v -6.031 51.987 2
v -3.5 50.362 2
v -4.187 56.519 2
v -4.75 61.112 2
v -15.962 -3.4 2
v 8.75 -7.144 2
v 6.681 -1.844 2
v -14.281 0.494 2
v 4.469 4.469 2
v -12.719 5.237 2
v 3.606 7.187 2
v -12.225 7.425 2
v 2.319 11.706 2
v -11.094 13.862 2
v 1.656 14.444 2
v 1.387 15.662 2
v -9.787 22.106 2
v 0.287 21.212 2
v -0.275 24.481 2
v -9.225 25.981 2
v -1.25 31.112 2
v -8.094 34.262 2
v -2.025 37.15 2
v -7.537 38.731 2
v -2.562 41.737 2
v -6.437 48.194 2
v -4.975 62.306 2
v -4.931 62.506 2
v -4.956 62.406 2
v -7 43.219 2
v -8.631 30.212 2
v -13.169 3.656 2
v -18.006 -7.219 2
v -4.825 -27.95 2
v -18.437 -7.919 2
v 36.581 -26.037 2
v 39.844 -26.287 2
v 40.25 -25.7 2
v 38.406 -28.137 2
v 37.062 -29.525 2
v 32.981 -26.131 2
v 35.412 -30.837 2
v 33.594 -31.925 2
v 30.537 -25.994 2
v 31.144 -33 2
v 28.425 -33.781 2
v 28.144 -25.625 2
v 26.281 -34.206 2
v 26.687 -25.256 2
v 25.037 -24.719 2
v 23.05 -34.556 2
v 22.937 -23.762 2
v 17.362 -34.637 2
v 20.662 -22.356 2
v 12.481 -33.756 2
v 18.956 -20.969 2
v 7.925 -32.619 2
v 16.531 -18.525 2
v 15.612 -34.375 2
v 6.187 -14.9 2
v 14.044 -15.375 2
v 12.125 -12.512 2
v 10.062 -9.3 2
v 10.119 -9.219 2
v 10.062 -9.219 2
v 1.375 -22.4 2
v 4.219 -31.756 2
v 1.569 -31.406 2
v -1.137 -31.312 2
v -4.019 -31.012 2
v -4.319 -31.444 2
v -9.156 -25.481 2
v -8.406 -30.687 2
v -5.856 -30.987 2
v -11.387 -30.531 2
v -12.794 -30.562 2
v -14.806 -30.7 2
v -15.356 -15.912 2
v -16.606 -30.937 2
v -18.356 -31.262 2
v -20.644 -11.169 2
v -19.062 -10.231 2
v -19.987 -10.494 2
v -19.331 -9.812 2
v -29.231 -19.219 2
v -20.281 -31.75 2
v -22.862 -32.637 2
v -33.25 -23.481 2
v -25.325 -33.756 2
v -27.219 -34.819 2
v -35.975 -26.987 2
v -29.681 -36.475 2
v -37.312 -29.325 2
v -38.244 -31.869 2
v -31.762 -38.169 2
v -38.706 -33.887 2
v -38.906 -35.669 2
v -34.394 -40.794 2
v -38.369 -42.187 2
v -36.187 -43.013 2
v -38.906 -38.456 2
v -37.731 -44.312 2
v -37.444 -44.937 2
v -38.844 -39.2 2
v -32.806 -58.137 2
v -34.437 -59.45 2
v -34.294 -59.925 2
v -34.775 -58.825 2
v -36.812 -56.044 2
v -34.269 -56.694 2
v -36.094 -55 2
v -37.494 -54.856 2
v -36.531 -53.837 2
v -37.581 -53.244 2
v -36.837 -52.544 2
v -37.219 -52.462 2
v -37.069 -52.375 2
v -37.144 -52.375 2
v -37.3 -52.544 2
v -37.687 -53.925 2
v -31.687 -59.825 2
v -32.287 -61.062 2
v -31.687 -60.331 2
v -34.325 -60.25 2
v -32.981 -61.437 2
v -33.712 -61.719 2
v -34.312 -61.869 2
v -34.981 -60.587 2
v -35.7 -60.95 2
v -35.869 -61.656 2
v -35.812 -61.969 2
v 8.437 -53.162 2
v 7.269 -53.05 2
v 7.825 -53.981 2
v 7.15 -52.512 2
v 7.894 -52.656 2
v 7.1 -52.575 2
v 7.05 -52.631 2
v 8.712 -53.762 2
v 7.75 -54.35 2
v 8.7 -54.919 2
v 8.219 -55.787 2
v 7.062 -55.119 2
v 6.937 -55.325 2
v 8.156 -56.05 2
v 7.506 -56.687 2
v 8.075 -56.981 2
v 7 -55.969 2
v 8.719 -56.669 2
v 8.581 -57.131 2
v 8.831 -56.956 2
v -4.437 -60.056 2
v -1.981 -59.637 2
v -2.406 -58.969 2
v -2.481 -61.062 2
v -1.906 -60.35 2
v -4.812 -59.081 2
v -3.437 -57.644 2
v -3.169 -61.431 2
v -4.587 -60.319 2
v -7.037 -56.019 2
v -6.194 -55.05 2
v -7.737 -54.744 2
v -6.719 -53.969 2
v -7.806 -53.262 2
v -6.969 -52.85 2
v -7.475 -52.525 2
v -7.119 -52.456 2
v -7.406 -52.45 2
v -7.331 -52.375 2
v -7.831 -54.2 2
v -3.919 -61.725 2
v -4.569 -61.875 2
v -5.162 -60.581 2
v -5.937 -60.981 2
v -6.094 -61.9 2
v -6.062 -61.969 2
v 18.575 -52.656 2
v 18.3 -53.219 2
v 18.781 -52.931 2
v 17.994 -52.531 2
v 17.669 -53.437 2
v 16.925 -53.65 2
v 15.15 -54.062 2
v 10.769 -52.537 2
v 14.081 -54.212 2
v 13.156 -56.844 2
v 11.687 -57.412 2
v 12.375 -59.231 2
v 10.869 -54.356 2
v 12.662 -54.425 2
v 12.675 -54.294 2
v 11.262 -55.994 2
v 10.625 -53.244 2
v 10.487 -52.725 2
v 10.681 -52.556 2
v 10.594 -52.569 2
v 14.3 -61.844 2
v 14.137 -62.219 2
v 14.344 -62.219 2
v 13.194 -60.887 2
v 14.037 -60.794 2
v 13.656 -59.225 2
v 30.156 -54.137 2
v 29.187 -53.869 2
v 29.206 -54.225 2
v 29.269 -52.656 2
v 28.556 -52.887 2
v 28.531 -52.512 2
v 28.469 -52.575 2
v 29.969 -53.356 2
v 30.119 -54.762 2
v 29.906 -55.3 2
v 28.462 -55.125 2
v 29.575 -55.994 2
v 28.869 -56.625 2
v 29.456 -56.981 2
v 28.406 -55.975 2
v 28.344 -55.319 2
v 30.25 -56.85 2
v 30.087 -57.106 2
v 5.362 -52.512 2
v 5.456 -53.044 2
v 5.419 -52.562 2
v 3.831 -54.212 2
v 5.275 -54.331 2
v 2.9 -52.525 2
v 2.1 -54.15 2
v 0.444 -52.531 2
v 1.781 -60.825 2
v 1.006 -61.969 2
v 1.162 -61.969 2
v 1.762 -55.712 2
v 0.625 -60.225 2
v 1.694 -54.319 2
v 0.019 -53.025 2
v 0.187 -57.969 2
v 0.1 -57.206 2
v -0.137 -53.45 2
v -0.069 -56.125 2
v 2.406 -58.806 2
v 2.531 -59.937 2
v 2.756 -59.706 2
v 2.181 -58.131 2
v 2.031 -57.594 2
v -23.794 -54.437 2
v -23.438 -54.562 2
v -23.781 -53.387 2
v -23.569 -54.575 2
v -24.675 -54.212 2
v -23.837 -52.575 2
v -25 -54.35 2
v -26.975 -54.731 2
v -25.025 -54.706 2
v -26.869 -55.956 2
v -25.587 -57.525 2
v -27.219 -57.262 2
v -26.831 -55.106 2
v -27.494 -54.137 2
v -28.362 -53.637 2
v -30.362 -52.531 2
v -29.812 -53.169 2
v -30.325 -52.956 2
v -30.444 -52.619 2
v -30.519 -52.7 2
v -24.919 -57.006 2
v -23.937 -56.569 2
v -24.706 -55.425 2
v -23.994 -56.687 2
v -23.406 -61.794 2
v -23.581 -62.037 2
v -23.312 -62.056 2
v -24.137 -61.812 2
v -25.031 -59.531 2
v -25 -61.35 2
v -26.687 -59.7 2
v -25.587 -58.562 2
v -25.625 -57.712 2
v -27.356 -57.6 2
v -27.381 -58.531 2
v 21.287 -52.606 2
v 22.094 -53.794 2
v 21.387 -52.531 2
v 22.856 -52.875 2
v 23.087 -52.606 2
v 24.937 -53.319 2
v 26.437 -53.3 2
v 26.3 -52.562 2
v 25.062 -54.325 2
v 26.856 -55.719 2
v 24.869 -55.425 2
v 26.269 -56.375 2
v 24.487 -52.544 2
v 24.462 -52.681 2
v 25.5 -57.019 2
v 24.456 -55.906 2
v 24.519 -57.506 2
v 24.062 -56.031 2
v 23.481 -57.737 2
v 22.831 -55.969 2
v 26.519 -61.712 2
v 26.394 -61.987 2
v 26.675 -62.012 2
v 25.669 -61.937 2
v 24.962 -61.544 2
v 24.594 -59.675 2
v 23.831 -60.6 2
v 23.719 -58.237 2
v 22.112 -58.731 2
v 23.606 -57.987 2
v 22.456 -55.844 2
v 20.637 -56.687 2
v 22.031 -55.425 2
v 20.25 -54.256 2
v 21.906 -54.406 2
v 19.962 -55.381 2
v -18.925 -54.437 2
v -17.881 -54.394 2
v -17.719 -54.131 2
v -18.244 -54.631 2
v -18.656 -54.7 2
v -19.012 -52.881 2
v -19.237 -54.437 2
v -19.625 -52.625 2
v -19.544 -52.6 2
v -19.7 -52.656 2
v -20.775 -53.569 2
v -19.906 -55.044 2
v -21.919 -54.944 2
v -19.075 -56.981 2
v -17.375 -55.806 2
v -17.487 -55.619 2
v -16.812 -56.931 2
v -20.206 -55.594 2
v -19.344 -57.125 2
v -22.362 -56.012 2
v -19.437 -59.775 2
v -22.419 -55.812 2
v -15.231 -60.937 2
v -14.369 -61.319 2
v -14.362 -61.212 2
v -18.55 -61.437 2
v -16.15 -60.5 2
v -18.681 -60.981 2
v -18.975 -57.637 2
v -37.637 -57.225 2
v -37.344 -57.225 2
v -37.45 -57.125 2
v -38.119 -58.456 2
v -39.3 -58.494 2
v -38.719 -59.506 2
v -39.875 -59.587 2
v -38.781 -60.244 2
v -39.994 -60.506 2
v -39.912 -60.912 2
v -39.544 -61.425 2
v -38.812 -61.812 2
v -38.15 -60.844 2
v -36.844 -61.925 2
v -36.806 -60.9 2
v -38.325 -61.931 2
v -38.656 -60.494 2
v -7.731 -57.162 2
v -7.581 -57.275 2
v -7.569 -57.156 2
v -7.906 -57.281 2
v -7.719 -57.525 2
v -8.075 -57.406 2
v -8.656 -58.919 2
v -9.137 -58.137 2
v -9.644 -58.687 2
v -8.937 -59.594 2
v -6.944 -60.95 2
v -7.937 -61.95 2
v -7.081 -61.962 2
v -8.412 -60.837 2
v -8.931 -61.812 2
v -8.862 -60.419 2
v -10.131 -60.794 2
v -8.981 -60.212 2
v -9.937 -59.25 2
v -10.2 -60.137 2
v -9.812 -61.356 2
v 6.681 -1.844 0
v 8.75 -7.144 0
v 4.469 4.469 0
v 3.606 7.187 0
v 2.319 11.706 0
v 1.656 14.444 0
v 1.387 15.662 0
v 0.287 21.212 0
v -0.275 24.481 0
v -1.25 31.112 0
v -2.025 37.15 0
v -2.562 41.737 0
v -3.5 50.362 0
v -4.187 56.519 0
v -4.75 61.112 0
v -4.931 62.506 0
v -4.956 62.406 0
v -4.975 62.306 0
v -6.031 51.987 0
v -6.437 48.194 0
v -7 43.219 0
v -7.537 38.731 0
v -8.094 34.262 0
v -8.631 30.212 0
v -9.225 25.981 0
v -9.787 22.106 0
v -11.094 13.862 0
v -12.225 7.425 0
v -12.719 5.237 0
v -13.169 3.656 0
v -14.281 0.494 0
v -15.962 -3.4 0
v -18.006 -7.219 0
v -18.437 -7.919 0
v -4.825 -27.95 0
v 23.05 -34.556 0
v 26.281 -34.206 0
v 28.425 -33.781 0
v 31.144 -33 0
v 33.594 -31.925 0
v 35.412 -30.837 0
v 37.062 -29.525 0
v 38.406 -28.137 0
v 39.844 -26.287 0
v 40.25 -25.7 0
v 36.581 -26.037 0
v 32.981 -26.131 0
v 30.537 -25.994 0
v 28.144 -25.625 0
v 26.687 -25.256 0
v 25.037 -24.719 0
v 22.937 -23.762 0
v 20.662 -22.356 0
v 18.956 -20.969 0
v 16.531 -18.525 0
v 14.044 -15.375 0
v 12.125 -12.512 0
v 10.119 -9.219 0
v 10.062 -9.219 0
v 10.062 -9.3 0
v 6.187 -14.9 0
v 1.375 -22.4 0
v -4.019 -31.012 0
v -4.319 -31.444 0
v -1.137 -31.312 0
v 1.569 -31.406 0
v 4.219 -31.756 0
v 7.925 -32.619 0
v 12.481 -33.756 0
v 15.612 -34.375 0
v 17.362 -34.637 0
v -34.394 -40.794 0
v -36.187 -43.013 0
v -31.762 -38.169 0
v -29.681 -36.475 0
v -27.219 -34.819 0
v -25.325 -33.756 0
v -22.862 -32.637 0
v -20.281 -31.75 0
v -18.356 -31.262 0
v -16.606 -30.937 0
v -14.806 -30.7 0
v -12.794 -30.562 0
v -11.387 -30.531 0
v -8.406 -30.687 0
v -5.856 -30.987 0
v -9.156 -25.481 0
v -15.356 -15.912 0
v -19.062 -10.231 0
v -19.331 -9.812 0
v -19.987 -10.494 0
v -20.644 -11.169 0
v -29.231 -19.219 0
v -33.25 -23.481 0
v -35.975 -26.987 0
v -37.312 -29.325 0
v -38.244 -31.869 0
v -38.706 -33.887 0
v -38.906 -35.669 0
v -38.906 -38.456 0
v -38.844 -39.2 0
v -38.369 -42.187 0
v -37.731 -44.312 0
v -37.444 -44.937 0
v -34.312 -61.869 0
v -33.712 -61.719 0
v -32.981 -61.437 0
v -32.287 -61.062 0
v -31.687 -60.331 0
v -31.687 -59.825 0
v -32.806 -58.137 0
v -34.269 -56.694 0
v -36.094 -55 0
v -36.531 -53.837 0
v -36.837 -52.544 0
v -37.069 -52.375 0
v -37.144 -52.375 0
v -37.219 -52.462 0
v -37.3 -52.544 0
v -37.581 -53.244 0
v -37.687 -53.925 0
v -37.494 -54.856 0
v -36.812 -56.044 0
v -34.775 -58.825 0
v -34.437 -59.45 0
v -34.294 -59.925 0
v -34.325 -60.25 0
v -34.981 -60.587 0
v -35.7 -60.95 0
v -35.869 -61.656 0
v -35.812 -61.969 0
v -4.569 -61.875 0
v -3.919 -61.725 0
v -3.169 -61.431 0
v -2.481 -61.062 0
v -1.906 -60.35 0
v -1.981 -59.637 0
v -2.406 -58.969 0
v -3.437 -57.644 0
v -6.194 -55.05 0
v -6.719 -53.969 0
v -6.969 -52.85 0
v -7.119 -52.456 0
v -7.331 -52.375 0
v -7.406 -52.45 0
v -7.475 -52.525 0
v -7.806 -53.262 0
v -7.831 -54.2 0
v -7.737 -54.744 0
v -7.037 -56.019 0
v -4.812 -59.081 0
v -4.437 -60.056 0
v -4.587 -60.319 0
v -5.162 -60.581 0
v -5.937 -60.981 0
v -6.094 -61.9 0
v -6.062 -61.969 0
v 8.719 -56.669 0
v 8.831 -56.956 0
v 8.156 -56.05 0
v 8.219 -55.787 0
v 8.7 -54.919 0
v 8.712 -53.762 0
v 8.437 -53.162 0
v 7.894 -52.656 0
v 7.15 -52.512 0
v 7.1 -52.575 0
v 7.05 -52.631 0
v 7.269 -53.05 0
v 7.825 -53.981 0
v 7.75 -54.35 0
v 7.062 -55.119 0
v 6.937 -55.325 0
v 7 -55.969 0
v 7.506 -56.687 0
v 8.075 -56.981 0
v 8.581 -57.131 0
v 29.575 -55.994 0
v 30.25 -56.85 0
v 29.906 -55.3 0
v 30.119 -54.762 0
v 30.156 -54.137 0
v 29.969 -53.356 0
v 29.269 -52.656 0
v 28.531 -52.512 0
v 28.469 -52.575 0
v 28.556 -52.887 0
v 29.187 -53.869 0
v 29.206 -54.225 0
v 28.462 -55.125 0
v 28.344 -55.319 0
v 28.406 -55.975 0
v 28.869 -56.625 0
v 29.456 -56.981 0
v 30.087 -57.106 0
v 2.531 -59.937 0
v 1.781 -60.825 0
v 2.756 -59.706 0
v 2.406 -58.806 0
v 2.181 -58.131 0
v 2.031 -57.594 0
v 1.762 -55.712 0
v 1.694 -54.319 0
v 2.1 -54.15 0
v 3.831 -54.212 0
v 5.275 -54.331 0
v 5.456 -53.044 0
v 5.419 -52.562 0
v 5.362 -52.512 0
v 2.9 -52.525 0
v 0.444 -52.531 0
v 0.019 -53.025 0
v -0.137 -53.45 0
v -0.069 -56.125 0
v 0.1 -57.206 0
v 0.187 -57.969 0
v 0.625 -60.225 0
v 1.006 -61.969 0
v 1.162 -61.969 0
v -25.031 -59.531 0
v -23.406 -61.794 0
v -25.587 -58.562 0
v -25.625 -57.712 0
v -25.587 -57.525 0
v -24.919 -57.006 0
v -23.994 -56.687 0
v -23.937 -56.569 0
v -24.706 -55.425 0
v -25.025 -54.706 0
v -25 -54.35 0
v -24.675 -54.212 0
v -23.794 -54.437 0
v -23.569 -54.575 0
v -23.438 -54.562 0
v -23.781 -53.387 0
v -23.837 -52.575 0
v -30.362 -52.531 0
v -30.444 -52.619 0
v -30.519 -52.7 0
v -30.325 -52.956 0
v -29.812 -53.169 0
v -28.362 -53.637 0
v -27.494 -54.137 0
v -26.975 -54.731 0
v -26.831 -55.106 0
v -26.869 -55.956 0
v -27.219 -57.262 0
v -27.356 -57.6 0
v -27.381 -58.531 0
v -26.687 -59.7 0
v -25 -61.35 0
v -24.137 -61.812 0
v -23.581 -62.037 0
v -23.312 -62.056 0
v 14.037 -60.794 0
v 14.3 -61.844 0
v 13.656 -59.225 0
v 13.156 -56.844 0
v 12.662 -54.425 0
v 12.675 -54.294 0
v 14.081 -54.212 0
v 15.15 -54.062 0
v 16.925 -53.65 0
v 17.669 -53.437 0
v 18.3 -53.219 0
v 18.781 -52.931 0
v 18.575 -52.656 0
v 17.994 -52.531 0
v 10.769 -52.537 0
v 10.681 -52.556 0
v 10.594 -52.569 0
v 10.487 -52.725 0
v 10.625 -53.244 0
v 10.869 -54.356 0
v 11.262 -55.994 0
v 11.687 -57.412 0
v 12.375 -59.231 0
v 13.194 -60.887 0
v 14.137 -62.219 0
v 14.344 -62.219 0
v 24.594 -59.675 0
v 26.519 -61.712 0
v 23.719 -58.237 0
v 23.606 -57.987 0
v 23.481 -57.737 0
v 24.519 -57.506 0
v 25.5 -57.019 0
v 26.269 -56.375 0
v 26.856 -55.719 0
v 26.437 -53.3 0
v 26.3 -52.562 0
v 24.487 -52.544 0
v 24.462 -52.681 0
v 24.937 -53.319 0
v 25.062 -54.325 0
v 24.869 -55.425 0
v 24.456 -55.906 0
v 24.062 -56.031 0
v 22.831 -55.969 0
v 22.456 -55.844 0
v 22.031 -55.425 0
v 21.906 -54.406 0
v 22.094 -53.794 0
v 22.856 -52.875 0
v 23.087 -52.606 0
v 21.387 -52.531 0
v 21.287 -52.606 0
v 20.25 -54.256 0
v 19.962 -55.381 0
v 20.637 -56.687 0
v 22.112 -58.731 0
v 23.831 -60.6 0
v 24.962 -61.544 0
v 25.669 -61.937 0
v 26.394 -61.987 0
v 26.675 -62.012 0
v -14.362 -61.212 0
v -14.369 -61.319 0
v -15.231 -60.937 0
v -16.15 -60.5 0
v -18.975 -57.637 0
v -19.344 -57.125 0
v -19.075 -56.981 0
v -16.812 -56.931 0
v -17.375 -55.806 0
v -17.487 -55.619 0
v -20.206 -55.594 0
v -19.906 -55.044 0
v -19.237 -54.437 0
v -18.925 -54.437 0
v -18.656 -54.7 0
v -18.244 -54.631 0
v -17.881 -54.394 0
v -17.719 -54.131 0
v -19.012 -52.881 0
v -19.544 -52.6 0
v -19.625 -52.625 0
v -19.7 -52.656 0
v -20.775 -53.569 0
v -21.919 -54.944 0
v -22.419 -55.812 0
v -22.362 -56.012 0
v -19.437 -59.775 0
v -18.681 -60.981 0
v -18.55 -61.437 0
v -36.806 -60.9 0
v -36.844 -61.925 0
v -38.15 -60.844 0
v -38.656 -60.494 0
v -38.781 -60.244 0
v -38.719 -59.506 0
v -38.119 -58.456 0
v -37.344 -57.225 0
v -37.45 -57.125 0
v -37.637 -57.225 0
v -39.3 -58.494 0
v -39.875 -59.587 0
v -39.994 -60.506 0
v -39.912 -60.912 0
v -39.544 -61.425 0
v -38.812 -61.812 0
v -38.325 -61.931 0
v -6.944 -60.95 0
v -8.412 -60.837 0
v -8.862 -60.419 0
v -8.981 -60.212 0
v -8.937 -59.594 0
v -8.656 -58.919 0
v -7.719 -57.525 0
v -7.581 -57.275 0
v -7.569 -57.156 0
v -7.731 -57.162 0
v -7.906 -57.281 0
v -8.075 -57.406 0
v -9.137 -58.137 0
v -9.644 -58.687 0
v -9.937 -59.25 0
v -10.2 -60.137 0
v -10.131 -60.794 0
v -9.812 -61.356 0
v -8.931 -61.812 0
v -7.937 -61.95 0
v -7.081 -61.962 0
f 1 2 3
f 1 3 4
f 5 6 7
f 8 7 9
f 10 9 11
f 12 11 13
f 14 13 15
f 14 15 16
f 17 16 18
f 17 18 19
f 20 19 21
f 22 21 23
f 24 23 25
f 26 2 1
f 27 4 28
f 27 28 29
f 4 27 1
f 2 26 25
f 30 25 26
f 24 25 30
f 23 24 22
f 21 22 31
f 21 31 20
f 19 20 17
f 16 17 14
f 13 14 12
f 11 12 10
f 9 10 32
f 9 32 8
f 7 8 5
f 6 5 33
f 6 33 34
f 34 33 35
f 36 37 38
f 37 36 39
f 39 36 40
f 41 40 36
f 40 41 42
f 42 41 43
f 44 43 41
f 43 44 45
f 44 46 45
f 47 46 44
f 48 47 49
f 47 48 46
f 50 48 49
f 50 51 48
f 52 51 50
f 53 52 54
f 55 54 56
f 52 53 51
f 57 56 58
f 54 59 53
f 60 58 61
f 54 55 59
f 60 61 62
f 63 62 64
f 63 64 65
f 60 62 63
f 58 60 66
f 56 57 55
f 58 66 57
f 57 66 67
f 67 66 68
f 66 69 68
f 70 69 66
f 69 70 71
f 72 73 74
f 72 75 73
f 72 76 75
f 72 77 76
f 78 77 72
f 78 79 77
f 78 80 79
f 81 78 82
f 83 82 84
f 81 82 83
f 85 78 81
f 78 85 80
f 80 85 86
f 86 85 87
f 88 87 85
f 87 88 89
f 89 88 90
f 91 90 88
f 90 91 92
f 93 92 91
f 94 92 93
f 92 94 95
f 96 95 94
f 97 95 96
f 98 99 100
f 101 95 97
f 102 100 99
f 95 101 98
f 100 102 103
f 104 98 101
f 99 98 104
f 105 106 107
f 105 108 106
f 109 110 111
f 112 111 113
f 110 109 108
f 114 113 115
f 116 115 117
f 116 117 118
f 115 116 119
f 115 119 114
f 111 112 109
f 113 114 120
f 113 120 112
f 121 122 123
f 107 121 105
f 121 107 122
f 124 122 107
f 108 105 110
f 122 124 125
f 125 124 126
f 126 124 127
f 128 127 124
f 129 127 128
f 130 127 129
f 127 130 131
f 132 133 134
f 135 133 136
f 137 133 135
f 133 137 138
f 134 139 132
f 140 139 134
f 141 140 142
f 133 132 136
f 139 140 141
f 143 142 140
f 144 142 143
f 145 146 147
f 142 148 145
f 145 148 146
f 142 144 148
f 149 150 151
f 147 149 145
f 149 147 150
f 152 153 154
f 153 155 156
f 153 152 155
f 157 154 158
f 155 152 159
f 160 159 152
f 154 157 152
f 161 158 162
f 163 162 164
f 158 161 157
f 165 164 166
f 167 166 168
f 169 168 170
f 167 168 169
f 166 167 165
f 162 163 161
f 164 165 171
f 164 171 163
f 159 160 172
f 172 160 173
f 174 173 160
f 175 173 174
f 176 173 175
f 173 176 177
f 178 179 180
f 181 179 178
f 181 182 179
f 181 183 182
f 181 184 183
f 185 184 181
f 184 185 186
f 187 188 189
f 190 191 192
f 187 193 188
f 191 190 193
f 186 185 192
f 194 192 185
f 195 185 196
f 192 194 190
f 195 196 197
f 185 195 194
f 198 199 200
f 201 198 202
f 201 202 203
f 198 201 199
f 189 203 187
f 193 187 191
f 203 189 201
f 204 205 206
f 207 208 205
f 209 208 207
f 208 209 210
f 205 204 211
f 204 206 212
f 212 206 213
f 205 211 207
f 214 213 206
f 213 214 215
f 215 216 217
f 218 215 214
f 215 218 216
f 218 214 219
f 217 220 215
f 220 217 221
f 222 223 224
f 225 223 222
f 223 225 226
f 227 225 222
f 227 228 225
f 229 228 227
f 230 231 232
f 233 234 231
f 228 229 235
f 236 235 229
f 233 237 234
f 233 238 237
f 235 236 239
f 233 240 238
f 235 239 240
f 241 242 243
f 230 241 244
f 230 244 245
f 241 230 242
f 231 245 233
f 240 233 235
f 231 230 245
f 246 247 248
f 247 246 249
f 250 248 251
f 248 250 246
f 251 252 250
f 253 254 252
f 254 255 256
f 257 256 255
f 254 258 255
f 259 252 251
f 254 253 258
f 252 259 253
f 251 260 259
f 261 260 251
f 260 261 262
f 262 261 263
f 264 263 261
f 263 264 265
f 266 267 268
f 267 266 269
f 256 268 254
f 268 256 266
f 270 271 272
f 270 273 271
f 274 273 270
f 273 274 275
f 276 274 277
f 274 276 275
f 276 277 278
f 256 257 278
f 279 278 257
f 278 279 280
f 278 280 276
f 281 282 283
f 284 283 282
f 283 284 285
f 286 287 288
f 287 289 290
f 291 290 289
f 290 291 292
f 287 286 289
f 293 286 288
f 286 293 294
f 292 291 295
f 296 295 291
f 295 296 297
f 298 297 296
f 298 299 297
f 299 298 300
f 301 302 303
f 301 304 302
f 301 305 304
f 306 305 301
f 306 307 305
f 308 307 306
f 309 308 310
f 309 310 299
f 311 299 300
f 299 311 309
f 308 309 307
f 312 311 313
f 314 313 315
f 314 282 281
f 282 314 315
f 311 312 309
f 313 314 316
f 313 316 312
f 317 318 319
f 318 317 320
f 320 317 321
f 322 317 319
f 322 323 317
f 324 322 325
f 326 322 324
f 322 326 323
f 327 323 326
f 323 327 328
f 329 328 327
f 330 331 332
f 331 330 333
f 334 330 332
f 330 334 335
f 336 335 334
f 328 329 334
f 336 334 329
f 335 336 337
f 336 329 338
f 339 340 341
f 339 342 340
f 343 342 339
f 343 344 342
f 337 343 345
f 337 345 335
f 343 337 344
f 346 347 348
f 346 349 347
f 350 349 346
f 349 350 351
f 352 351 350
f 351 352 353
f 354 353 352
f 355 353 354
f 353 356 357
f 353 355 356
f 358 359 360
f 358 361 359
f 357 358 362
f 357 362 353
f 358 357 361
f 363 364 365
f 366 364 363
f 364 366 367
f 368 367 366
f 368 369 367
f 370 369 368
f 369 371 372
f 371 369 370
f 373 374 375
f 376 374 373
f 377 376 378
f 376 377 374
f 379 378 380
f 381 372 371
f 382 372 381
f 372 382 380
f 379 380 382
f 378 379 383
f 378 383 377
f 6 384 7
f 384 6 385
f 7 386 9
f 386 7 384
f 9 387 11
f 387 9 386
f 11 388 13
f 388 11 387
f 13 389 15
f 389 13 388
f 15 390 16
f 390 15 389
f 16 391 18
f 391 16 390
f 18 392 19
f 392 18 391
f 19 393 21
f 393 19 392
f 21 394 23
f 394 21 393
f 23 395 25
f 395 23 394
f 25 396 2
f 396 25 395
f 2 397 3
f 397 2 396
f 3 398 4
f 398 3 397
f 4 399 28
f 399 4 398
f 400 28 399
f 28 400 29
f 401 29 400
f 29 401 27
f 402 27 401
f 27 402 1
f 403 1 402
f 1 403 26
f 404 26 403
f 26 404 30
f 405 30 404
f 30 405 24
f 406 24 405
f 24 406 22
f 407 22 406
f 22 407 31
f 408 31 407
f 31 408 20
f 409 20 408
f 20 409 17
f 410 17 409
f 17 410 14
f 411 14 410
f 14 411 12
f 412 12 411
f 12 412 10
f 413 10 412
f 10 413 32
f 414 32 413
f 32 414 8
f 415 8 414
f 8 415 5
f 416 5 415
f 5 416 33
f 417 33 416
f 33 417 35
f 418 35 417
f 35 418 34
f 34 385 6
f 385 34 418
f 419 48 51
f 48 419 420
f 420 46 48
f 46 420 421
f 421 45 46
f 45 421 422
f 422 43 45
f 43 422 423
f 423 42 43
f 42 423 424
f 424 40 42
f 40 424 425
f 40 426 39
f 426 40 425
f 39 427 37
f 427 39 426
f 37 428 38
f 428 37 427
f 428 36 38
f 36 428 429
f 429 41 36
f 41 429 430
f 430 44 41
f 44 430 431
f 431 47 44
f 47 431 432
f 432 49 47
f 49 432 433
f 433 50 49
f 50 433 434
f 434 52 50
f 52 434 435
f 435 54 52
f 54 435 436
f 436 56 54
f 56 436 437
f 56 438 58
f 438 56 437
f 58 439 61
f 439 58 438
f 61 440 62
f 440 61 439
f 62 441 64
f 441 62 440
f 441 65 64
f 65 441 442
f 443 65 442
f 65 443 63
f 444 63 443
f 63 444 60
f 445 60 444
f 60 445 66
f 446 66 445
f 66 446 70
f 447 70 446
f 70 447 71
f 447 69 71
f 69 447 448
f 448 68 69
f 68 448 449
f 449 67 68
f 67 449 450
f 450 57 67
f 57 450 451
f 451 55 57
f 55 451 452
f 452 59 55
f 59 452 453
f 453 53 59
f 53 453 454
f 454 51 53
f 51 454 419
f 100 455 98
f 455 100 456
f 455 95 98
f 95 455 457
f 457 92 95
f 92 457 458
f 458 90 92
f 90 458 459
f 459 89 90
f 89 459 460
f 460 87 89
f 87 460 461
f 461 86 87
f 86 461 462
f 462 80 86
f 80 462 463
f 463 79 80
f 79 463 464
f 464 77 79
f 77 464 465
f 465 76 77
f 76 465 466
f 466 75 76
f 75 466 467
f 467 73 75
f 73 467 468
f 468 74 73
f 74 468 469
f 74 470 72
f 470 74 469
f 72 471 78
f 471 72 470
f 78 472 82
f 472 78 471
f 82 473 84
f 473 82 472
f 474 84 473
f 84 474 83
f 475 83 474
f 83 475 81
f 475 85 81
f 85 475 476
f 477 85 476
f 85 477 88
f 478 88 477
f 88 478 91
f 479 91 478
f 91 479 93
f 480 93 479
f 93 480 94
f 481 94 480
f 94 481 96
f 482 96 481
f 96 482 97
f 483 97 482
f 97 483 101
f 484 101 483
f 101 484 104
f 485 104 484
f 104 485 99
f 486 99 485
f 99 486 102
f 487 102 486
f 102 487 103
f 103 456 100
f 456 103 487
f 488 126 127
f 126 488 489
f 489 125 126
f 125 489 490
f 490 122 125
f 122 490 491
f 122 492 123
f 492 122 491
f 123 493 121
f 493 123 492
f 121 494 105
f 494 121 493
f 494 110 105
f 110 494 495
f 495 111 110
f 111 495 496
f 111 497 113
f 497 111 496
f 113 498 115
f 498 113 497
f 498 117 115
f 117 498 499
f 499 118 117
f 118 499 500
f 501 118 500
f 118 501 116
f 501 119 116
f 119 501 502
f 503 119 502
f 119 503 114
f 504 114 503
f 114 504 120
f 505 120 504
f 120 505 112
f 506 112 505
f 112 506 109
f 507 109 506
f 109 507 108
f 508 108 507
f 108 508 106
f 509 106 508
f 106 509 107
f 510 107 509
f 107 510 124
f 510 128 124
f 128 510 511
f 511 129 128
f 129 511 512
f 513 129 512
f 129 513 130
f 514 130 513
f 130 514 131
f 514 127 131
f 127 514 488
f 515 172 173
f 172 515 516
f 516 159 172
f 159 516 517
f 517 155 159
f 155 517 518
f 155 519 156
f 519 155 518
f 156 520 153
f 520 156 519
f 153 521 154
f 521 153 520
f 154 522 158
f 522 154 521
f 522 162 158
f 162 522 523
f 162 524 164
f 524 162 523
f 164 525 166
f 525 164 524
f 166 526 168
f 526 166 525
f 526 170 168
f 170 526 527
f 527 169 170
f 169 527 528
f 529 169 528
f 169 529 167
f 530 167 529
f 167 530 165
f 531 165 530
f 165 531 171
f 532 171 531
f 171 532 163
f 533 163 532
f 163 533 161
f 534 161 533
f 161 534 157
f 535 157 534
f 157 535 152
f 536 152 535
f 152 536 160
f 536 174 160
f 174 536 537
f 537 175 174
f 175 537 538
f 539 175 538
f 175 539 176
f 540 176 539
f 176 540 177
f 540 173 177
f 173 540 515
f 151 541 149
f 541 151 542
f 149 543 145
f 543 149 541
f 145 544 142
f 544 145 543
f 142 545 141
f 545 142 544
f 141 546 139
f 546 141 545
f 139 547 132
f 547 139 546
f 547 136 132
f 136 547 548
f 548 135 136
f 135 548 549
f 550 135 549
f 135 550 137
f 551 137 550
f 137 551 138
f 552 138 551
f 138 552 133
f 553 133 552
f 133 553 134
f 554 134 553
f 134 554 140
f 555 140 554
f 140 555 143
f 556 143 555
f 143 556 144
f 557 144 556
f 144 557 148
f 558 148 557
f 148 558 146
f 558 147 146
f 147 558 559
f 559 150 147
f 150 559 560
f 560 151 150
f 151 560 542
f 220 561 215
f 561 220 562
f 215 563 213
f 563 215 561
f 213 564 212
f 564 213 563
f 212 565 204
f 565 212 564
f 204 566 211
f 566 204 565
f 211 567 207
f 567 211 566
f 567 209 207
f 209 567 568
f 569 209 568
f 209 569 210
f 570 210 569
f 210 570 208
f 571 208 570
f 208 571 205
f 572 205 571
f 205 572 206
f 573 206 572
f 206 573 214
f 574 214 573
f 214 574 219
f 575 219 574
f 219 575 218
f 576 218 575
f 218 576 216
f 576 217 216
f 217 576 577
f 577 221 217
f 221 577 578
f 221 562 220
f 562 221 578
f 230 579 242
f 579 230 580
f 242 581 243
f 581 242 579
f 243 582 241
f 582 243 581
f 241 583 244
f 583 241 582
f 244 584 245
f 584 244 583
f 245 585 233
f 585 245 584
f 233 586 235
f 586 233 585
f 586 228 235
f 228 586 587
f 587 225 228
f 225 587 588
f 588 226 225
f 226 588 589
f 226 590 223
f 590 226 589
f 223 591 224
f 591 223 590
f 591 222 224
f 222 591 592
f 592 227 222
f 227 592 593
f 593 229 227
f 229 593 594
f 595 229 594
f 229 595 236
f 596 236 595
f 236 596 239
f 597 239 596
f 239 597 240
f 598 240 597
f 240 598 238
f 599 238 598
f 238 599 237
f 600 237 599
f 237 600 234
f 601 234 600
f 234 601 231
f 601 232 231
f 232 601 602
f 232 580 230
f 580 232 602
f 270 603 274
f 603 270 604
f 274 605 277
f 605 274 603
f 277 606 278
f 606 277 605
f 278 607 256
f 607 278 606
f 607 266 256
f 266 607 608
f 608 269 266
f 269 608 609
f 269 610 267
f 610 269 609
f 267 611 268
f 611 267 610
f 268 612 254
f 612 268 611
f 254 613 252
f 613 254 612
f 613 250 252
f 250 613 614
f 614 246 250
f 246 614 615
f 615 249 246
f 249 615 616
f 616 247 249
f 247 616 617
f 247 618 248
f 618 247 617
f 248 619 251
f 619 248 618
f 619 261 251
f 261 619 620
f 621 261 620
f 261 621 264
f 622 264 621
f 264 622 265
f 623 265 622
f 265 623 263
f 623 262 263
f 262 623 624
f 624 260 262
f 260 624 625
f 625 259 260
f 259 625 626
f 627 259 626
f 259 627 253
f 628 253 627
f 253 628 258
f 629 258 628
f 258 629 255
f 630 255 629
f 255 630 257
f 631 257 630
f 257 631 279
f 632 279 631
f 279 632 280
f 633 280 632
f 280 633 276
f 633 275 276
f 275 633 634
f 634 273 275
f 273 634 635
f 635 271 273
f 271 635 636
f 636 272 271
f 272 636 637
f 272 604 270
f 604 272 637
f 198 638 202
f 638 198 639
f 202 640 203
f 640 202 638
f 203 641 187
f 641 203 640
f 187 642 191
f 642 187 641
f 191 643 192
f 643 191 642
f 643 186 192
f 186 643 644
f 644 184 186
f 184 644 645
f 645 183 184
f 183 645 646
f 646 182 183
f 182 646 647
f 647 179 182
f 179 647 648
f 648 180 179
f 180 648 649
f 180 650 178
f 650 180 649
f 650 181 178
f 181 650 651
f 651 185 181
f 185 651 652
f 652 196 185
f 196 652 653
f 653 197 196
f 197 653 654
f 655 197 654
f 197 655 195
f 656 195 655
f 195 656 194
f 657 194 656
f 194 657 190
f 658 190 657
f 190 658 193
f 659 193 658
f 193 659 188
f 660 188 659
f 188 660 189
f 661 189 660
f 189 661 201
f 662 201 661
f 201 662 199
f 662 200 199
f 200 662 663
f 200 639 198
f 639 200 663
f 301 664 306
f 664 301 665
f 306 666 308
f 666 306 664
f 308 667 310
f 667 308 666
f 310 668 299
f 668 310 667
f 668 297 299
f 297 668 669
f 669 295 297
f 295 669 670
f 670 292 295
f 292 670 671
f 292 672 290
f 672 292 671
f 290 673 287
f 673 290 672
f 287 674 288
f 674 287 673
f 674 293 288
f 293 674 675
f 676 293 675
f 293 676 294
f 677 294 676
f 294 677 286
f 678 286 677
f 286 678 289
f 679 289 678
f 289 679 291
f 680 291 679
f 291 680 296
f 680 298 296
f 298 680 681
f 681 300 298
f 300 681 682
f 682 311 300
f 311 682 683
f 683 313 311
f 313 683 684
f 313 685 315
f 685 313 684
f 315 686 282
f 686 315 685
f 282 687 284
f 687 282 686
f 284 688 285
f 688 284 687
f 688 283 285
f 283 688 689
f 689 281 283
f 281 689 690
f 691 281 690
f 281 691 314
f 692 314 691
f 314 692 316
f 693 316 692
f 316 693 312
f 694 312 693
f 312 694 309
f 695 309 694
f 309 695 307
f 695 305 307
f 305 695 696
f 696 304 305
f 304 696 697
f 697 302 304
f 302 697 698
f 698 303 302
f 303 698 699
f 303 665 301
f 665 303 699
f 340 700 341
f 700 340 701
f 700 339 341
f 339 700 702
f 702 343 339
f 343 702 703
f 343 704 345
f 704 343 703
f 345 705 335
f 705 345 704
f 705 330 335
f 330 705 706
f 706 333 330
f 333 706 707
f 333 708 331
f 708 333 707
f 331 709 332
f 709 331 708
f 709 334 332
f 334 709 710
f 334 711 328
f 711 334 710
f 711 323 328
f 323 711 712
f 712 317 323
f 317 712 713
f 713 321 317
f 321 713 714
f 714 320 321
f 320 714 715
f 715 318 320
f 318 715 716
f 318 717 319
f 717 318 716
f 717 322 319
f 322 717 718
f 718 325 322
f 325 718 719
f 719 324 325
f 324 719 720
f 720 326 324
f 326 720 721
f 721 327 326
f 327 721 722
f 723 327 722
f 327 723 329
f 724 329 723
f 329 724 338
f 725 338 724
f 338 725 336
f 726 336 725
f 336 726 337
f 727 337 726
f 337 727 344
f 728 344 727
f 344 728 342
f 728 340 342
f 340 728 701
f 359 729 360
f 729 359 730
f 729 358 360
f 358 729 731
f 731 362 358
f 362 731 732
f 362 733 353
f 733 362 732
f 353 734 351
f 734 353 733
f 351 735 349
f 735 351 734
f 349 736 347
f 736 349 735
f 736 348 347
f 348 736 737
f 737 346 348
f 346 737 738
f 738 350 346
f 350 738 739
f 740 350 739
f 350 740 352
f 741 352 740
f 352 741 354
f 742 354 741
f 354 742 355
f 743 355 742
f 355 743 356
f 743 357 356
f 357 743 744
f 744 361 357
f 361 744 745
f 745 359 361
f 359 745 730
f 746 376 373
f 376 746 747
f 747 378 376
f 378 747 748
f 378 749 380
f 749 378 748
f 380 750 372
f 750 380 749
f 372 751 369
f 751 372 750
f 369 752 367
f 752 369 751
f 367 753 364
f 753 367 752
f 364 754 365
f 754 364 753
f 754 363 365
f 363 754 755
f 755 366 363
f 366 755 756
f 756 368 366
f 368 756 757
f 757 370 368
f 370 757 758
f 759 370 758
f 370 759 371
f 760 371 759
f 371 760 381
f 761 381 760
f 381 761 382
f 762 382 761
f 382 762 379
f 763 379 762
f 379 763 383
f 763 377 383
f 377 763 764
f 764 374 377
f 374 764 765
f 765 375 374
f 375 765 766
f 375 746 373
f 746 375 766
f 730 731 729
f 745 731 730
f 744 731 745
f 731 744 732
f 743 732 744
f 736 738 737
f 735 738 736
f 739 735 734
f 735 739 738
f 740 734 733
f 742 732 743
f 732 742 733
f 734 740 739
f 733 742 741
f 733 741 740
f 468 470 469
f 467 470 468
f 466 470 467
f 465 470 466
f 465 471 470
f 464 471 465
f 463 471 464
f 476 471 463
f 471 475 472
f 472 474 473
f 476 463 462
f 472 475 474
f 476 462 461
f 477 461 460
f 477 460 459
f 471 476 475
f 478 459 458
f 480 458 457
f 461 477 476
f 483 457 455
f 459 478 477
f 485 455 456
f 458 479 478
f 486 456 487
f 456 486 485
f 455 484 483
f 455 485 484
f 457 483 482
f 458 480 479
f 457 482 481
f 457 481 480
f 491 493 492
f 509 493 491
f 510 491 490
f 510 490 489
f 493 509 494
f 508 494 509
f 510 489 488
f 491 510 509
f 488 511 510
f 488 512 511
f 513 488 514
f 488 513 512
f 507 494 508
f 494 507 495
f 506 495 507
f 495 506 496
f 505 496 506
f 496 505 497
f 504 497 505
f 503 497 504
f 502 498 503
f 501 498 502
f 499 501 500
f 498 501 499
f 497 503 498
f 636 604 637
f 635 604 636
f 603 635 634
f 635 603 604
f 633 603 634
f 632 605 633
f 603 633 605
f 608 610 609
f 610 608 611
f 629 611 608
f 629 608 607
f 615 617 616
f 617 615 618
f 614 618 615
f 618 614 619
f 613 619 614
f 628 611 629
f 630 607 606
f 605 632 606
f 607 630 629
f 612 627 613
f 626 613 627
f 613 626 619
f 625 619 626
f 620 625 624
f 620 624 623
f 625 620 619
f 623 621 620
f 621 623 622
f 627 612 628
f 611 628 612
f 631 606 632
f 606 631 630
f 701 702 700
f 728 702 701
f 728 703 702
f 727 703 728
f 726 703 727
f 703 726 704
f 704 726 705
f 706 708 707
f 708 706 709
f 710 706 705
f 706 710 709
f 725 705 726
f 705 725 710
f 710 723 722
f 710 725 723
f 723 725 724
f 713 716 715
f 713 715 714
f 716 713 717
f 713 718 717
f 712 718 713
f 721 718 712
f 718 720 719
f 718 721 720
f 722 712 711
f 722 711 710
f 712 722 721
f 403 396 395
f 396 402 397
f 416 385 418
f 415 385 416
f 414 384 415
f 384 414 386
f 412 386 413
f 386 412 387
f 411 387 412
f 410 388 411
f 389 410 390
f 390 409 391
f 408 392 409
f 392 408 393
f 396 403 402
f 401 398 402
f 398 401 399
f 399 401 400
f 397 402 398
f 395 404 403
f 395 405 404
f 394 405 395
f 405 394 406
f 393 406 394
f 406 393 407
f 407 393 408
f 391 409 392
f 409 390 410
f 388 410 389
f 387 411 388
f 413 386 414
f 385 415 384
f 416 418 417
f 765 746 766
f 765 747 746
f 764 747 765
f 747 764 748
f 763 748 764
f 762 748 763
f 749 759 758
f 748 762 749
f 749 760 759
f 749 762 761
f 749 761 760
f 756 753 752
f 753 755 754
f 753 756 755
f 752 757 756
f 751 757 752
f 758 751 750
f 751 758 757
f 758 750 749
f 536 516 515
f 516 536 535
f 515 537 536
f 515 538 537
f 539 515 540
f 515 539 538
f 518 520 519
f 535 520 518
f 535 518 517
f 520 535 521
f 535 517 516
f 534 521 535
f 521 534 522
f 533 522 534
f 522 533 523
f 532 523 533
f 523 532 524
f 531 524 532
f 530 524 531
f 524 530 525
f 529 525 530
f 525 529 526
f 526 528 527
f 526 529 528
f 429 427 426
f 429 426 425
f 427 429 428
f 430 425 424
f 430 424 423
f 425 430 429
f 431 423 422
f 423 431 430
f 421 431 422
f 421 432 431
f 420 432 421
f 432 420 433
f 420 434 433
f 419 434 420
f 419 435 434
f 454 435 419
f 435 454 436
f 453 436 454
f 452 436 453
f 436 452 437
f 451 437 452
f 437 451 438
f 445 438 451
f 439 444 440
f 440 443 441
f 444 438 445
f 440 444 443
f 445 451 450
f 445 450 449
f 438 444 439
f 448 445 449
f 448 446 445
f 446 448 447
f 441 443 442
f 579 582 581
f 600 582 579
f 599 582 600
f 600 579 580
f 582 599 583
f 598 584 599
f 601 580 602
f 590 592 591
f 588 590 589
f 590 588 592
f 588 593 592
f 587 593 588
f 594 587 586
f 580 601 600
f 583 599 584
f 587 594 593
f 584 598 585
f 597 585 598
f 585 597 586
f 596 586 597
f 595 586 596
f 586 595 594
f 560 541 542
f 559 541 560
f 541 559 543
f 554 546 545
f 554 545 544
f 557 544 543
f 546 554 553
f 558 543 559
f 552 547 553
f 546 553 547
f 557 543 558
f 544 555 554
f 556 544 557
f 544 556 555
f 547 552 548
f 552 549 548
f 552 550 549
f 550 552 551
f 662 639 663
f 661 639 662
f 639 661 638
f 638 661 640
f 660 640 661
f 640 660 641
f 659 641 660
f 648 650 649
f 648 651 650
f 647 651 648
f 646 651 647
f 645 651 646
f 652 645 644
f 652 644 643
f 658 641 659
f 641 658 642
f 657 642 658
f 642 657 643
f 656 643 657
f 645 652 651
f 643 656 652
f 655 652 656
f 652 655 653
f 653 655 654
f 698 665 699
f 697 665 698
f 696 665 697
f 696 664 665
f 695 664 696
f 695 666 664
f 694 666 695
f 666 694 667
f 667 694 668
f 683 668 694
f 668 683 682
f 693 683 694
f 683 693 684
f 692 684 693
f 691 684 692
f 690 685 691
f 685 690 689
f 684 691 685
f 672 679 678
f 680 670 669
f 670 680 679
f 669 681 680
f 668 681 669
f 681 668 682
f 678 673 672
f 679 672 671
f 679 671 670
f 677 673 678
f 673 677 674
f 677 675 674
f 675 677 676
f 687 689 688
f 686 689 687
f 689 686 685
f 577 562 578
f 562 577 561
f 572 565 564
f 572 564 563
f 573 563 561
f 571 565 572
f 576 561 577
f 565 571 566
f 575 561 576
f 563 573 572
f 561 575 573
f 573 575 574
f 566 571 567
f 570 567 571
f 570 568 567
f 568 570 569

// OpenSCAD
module ef6d4f2d06e8420b6f7fc7ee8015170d_1()
{
 /* Generated by trace2scad version 20150415
    http://aggregate.org/MAKE/TRACE2SCAD/
    Optimized model has 387/4796 original points
 */
 color([0.48, 0.48, 0.48])
 assign(minx=0) /* polygon minx=39 */
 assign(miny=0) /* polygon miny=45 */
 assign(maxx=12880) /* polygon maxx=12880 */
 assign(maxy=20000) /* polygon maxy=20001 */
 assign(dx=maxx-minx)
 assign(dy=maxy-miny)
 assign(maxd=((dx>dy)?dx:dy))
 scale([1/maxd, 1/maxd, 1])
 translate([-minx-dx/2, -miny-dy/2, 0])
 linear_extrude(height=1, convexity=387)
 union() {
  union() {
   polygon([[5647,19985],[5644,19969],[5475,18318],[5410,17711],[5320,16915],[5234,16197],[5145,15482],[5059,14834],[4964,14157],[4874,13537],[4665,12218],[4484,11188],[4405,10838],[4333,10585],[4155,10079],[3886,9456],[3559,8845],[3490,8733],[5668,5528],[7840,8857],[7509,9705],[7155,10715],[7017,11150],[6811,11873],[6705,12311],[6662,12506],[6486,13394],[6396,13917],[6240,14978],[6116,15944],[6030,16678],[5880,18058],[5770,19043],[5680,19778],[5651,20001]], convexity=6);
   polygon([[8050,8518],[8050,8512],[7430,7616],[6660,6416],[5797,5038],[5749,4969],[6258,4990],[6691,4975],[7115,4919],[7708,4781],[8437,4599],[8938,4500],[9218,4458],[10128,4471],[10645,4527],[10988,4595],[11423,4720],[11815,4892],[12106,5066],[12370,5276],[12585,5498],[12815,5794],[12880,5888],[12293,5834],[11717,5819],[11326,5841],[10943,5900],[10710,5959],[10446,6045],[10110,6198],[9746,6423],[9473,6645],[9085,7036],[8687,7540],[8380,7998],[8059,8525],[8050,8525]], convexity=9);
   polygon([[3242,8321],[3137,8213],[1763,6925],[1120,6243],[684,5682],[470,5308],[321,4901],[247,4578],[215,4293],[215,3847],[225,3728],[301,3250],[403,2910],[449,2810],[650,3118],[937,3473],[1358,3893],[1691,4164],[2085,4429],[2388,4599],[2782,4778],[3195,4920],[3503,4998],[3783,5050],[4071,5088],[4393,5110],[4618,5115],[5095,5090],[5503,5042],[4975,5923],[3983,7454],[3390,8363],[3347,8430]], convexity=7);
   polygon([[485,1606],[472,1593],[427,1481],[410,1372],[441,1223],[550,1033],[876,588],[930,488],[953,412],[948,360],[843,306],[728,248],[701,135],[710,85],[950,101],[1046,125],[1163,170],[1274,230],[1370,347],[1370,428],[1191,698],[957,929],[665,1200],[595,1386],[546,1593],[509,1620],[497,1620]], convexity=8);
   polygon([[5255,1608],[5244,1596],[5191,1478],[5187,1328],[5202,1241],[5314,1037],[5670,547],[5730,391],[5706,349],[5614,307],[5490,243],[5465,96],[5470,85],[5709,100],[5813,124],[5933,171],[6043,230],[6135,344],[6123,458],[6055,565],[5890,777],[5449,1192],[5365,1365],[5325,1544],[5301,1607],[5267,1620]], convexity=8);
   polygon([[6904,1596],[6511,1595],[6443,1516],[6418,1448],[6429,1020],[6456,847],[6470,725],[6540,364],[6601,85],[6626,85],[6725,268],[6845,410],[6881,447],[6825,591],[6789,699],[6765,785],[6722,1086],[6711,1309],[6776,1336],[7053,1326],[7284,1307],[7313,1513],[7307,1590],[7298,1598]], convexity=10);
   polygon([[7576,1588],[7568,1579],[7603,1512],[7692,1363],[7680,1304],[7570,1181],[7550,1148],[7560,1045],[7641,930],[7732,883],[7813,859],[7853,887],[7835,933],[7745,1032],[7755,1074],[7832,1213],[7834,1398],[7790,1494],[7703,1575],[7584,1598]], convexity=10);
   polygon([[11000,1593],[10995,1588],[11009,1538],[11110,1381],[11113,1324],[10994,1180],[10975,1149],[10985,1044],[11059,940],[11153,883],[11254,863],[11280,904],[11172,1041],[11225,1152],[11259,1238],[11265,1338],[11235,1463],[11123,1575],[11005,1598]], convexity=10);
   polygon([[1569,1581],[1557,1568],[1588,1527],[1670,1493],[1902,1418],[2041,1338],[2124,1243],[2147,1183],[2141,1047],[2085,838],[2063,784],[2059,635],[2170,448],[2440,184],[2578,110],[2667,74],[2710,71],[2695,113],[2435,475],[2346,630],[2340,766],[2346,796],[2453,879],[2601,930],[2610,949],[2487,1132],[2436,1247],[2440,1304],[2492,1326],[2633,1290],[2669,1268],[2690,1270],[2635,1458],[2626,1588],[1582,1595]], convexity=13);
   polygon([[8149,1591],[8135,1589],[8118,1564],[8140,1481],[8179,1303],[8242,1041],[8310,814],[8420,523],[8551,258],[8702,45],[8735,45],[8728,105],[8686,273],[8625,524],[8545,905],[8466,1292],[8468,1313],[8693,1326],[8864,1350],[9148,1416],[9267,1450],[9368,1485],[9445,1531],[9412,1575],[9319,1595],[8163,1594]], convexity=9);
   polygon([[9854,1589],[9846,1583],[9680,1319],[9634,1139],[9742,930],[9978,603],[10253,304],[10434,153],[10547,90],[10663,82],[10708,78],[10683,126],[10375,452],[10235,682],[10217,722],[10197,762],[10363,799],[10520,877],[10643,980],[10737,1085],[10670,1472],[10648,1590],[10358,1593],[10354,1571],[10430,1469],[10450,1308],[10419,1132],[10353,1055],[10290,1035],[10093,1045],[10033,1065],[9965,1132],[9945,1295],[9975,1393],[10097,1540],[10134,1583],[9862,1595]], convexity=13);
   polygon([[3300,1580],[3288,1575],[3116,1429],[2933,1209],[2853,1070],[2862,1038],[3330,436],[3451,243],[3472,170],[4141,189],[4142,206],[4003,250],[3856,320],[3404,778],[3345,860],[3388,883],[3750,891],[3660,1071],[3642,1101],[3207,1105],[3255,1193],[3362,1290],[3412,1290],[3455,1248],[3521,1259],[3579,1297],[3605,1339],[3398,1539],[3313,1584]], convexity=12);
   polygon([[433,852],[418,844],[152,641],[60,466],[41,319],[54,254],[113,172],[230,110],[308,91],[545,92],[551,256],[336,265],[255,321],[235,361],[245,479],[341,647],[465,844],[448,860]], convexity=8);
   polygon([[5175,835],[5148,815],[4978,698],[4897,610],[4850,520],[4808,378],[4819,273],[4870,183],[5011,110],[5170,88],[5307,86],[5329,248],[5094,266],[5022,333],[5003,366],[5010,465],[5055,573],[5205,796],[5227,836],[5229,855],[5203,854]], convexity=8);
  }
 }
}

module ef6d4f2d06e8420b6f7fc7ee8015170d()
{
 /* all layers combined, scaled to within a 1mm cube */
 scale([1, 1, 1/1])
 difference() {
  union() {
   scale([1,1,2]) translate([0,0,-0.5]) ef6d4f2d06e8420b6f7fc7ee8015170d_1();
  }
  translate([0,0,-2]) cube([2,2,4],center=true);
 }
}

scale([125, 125, 2]) {
	ef6d4f2d06e8420b6f7fc7ee8015170d();
}
